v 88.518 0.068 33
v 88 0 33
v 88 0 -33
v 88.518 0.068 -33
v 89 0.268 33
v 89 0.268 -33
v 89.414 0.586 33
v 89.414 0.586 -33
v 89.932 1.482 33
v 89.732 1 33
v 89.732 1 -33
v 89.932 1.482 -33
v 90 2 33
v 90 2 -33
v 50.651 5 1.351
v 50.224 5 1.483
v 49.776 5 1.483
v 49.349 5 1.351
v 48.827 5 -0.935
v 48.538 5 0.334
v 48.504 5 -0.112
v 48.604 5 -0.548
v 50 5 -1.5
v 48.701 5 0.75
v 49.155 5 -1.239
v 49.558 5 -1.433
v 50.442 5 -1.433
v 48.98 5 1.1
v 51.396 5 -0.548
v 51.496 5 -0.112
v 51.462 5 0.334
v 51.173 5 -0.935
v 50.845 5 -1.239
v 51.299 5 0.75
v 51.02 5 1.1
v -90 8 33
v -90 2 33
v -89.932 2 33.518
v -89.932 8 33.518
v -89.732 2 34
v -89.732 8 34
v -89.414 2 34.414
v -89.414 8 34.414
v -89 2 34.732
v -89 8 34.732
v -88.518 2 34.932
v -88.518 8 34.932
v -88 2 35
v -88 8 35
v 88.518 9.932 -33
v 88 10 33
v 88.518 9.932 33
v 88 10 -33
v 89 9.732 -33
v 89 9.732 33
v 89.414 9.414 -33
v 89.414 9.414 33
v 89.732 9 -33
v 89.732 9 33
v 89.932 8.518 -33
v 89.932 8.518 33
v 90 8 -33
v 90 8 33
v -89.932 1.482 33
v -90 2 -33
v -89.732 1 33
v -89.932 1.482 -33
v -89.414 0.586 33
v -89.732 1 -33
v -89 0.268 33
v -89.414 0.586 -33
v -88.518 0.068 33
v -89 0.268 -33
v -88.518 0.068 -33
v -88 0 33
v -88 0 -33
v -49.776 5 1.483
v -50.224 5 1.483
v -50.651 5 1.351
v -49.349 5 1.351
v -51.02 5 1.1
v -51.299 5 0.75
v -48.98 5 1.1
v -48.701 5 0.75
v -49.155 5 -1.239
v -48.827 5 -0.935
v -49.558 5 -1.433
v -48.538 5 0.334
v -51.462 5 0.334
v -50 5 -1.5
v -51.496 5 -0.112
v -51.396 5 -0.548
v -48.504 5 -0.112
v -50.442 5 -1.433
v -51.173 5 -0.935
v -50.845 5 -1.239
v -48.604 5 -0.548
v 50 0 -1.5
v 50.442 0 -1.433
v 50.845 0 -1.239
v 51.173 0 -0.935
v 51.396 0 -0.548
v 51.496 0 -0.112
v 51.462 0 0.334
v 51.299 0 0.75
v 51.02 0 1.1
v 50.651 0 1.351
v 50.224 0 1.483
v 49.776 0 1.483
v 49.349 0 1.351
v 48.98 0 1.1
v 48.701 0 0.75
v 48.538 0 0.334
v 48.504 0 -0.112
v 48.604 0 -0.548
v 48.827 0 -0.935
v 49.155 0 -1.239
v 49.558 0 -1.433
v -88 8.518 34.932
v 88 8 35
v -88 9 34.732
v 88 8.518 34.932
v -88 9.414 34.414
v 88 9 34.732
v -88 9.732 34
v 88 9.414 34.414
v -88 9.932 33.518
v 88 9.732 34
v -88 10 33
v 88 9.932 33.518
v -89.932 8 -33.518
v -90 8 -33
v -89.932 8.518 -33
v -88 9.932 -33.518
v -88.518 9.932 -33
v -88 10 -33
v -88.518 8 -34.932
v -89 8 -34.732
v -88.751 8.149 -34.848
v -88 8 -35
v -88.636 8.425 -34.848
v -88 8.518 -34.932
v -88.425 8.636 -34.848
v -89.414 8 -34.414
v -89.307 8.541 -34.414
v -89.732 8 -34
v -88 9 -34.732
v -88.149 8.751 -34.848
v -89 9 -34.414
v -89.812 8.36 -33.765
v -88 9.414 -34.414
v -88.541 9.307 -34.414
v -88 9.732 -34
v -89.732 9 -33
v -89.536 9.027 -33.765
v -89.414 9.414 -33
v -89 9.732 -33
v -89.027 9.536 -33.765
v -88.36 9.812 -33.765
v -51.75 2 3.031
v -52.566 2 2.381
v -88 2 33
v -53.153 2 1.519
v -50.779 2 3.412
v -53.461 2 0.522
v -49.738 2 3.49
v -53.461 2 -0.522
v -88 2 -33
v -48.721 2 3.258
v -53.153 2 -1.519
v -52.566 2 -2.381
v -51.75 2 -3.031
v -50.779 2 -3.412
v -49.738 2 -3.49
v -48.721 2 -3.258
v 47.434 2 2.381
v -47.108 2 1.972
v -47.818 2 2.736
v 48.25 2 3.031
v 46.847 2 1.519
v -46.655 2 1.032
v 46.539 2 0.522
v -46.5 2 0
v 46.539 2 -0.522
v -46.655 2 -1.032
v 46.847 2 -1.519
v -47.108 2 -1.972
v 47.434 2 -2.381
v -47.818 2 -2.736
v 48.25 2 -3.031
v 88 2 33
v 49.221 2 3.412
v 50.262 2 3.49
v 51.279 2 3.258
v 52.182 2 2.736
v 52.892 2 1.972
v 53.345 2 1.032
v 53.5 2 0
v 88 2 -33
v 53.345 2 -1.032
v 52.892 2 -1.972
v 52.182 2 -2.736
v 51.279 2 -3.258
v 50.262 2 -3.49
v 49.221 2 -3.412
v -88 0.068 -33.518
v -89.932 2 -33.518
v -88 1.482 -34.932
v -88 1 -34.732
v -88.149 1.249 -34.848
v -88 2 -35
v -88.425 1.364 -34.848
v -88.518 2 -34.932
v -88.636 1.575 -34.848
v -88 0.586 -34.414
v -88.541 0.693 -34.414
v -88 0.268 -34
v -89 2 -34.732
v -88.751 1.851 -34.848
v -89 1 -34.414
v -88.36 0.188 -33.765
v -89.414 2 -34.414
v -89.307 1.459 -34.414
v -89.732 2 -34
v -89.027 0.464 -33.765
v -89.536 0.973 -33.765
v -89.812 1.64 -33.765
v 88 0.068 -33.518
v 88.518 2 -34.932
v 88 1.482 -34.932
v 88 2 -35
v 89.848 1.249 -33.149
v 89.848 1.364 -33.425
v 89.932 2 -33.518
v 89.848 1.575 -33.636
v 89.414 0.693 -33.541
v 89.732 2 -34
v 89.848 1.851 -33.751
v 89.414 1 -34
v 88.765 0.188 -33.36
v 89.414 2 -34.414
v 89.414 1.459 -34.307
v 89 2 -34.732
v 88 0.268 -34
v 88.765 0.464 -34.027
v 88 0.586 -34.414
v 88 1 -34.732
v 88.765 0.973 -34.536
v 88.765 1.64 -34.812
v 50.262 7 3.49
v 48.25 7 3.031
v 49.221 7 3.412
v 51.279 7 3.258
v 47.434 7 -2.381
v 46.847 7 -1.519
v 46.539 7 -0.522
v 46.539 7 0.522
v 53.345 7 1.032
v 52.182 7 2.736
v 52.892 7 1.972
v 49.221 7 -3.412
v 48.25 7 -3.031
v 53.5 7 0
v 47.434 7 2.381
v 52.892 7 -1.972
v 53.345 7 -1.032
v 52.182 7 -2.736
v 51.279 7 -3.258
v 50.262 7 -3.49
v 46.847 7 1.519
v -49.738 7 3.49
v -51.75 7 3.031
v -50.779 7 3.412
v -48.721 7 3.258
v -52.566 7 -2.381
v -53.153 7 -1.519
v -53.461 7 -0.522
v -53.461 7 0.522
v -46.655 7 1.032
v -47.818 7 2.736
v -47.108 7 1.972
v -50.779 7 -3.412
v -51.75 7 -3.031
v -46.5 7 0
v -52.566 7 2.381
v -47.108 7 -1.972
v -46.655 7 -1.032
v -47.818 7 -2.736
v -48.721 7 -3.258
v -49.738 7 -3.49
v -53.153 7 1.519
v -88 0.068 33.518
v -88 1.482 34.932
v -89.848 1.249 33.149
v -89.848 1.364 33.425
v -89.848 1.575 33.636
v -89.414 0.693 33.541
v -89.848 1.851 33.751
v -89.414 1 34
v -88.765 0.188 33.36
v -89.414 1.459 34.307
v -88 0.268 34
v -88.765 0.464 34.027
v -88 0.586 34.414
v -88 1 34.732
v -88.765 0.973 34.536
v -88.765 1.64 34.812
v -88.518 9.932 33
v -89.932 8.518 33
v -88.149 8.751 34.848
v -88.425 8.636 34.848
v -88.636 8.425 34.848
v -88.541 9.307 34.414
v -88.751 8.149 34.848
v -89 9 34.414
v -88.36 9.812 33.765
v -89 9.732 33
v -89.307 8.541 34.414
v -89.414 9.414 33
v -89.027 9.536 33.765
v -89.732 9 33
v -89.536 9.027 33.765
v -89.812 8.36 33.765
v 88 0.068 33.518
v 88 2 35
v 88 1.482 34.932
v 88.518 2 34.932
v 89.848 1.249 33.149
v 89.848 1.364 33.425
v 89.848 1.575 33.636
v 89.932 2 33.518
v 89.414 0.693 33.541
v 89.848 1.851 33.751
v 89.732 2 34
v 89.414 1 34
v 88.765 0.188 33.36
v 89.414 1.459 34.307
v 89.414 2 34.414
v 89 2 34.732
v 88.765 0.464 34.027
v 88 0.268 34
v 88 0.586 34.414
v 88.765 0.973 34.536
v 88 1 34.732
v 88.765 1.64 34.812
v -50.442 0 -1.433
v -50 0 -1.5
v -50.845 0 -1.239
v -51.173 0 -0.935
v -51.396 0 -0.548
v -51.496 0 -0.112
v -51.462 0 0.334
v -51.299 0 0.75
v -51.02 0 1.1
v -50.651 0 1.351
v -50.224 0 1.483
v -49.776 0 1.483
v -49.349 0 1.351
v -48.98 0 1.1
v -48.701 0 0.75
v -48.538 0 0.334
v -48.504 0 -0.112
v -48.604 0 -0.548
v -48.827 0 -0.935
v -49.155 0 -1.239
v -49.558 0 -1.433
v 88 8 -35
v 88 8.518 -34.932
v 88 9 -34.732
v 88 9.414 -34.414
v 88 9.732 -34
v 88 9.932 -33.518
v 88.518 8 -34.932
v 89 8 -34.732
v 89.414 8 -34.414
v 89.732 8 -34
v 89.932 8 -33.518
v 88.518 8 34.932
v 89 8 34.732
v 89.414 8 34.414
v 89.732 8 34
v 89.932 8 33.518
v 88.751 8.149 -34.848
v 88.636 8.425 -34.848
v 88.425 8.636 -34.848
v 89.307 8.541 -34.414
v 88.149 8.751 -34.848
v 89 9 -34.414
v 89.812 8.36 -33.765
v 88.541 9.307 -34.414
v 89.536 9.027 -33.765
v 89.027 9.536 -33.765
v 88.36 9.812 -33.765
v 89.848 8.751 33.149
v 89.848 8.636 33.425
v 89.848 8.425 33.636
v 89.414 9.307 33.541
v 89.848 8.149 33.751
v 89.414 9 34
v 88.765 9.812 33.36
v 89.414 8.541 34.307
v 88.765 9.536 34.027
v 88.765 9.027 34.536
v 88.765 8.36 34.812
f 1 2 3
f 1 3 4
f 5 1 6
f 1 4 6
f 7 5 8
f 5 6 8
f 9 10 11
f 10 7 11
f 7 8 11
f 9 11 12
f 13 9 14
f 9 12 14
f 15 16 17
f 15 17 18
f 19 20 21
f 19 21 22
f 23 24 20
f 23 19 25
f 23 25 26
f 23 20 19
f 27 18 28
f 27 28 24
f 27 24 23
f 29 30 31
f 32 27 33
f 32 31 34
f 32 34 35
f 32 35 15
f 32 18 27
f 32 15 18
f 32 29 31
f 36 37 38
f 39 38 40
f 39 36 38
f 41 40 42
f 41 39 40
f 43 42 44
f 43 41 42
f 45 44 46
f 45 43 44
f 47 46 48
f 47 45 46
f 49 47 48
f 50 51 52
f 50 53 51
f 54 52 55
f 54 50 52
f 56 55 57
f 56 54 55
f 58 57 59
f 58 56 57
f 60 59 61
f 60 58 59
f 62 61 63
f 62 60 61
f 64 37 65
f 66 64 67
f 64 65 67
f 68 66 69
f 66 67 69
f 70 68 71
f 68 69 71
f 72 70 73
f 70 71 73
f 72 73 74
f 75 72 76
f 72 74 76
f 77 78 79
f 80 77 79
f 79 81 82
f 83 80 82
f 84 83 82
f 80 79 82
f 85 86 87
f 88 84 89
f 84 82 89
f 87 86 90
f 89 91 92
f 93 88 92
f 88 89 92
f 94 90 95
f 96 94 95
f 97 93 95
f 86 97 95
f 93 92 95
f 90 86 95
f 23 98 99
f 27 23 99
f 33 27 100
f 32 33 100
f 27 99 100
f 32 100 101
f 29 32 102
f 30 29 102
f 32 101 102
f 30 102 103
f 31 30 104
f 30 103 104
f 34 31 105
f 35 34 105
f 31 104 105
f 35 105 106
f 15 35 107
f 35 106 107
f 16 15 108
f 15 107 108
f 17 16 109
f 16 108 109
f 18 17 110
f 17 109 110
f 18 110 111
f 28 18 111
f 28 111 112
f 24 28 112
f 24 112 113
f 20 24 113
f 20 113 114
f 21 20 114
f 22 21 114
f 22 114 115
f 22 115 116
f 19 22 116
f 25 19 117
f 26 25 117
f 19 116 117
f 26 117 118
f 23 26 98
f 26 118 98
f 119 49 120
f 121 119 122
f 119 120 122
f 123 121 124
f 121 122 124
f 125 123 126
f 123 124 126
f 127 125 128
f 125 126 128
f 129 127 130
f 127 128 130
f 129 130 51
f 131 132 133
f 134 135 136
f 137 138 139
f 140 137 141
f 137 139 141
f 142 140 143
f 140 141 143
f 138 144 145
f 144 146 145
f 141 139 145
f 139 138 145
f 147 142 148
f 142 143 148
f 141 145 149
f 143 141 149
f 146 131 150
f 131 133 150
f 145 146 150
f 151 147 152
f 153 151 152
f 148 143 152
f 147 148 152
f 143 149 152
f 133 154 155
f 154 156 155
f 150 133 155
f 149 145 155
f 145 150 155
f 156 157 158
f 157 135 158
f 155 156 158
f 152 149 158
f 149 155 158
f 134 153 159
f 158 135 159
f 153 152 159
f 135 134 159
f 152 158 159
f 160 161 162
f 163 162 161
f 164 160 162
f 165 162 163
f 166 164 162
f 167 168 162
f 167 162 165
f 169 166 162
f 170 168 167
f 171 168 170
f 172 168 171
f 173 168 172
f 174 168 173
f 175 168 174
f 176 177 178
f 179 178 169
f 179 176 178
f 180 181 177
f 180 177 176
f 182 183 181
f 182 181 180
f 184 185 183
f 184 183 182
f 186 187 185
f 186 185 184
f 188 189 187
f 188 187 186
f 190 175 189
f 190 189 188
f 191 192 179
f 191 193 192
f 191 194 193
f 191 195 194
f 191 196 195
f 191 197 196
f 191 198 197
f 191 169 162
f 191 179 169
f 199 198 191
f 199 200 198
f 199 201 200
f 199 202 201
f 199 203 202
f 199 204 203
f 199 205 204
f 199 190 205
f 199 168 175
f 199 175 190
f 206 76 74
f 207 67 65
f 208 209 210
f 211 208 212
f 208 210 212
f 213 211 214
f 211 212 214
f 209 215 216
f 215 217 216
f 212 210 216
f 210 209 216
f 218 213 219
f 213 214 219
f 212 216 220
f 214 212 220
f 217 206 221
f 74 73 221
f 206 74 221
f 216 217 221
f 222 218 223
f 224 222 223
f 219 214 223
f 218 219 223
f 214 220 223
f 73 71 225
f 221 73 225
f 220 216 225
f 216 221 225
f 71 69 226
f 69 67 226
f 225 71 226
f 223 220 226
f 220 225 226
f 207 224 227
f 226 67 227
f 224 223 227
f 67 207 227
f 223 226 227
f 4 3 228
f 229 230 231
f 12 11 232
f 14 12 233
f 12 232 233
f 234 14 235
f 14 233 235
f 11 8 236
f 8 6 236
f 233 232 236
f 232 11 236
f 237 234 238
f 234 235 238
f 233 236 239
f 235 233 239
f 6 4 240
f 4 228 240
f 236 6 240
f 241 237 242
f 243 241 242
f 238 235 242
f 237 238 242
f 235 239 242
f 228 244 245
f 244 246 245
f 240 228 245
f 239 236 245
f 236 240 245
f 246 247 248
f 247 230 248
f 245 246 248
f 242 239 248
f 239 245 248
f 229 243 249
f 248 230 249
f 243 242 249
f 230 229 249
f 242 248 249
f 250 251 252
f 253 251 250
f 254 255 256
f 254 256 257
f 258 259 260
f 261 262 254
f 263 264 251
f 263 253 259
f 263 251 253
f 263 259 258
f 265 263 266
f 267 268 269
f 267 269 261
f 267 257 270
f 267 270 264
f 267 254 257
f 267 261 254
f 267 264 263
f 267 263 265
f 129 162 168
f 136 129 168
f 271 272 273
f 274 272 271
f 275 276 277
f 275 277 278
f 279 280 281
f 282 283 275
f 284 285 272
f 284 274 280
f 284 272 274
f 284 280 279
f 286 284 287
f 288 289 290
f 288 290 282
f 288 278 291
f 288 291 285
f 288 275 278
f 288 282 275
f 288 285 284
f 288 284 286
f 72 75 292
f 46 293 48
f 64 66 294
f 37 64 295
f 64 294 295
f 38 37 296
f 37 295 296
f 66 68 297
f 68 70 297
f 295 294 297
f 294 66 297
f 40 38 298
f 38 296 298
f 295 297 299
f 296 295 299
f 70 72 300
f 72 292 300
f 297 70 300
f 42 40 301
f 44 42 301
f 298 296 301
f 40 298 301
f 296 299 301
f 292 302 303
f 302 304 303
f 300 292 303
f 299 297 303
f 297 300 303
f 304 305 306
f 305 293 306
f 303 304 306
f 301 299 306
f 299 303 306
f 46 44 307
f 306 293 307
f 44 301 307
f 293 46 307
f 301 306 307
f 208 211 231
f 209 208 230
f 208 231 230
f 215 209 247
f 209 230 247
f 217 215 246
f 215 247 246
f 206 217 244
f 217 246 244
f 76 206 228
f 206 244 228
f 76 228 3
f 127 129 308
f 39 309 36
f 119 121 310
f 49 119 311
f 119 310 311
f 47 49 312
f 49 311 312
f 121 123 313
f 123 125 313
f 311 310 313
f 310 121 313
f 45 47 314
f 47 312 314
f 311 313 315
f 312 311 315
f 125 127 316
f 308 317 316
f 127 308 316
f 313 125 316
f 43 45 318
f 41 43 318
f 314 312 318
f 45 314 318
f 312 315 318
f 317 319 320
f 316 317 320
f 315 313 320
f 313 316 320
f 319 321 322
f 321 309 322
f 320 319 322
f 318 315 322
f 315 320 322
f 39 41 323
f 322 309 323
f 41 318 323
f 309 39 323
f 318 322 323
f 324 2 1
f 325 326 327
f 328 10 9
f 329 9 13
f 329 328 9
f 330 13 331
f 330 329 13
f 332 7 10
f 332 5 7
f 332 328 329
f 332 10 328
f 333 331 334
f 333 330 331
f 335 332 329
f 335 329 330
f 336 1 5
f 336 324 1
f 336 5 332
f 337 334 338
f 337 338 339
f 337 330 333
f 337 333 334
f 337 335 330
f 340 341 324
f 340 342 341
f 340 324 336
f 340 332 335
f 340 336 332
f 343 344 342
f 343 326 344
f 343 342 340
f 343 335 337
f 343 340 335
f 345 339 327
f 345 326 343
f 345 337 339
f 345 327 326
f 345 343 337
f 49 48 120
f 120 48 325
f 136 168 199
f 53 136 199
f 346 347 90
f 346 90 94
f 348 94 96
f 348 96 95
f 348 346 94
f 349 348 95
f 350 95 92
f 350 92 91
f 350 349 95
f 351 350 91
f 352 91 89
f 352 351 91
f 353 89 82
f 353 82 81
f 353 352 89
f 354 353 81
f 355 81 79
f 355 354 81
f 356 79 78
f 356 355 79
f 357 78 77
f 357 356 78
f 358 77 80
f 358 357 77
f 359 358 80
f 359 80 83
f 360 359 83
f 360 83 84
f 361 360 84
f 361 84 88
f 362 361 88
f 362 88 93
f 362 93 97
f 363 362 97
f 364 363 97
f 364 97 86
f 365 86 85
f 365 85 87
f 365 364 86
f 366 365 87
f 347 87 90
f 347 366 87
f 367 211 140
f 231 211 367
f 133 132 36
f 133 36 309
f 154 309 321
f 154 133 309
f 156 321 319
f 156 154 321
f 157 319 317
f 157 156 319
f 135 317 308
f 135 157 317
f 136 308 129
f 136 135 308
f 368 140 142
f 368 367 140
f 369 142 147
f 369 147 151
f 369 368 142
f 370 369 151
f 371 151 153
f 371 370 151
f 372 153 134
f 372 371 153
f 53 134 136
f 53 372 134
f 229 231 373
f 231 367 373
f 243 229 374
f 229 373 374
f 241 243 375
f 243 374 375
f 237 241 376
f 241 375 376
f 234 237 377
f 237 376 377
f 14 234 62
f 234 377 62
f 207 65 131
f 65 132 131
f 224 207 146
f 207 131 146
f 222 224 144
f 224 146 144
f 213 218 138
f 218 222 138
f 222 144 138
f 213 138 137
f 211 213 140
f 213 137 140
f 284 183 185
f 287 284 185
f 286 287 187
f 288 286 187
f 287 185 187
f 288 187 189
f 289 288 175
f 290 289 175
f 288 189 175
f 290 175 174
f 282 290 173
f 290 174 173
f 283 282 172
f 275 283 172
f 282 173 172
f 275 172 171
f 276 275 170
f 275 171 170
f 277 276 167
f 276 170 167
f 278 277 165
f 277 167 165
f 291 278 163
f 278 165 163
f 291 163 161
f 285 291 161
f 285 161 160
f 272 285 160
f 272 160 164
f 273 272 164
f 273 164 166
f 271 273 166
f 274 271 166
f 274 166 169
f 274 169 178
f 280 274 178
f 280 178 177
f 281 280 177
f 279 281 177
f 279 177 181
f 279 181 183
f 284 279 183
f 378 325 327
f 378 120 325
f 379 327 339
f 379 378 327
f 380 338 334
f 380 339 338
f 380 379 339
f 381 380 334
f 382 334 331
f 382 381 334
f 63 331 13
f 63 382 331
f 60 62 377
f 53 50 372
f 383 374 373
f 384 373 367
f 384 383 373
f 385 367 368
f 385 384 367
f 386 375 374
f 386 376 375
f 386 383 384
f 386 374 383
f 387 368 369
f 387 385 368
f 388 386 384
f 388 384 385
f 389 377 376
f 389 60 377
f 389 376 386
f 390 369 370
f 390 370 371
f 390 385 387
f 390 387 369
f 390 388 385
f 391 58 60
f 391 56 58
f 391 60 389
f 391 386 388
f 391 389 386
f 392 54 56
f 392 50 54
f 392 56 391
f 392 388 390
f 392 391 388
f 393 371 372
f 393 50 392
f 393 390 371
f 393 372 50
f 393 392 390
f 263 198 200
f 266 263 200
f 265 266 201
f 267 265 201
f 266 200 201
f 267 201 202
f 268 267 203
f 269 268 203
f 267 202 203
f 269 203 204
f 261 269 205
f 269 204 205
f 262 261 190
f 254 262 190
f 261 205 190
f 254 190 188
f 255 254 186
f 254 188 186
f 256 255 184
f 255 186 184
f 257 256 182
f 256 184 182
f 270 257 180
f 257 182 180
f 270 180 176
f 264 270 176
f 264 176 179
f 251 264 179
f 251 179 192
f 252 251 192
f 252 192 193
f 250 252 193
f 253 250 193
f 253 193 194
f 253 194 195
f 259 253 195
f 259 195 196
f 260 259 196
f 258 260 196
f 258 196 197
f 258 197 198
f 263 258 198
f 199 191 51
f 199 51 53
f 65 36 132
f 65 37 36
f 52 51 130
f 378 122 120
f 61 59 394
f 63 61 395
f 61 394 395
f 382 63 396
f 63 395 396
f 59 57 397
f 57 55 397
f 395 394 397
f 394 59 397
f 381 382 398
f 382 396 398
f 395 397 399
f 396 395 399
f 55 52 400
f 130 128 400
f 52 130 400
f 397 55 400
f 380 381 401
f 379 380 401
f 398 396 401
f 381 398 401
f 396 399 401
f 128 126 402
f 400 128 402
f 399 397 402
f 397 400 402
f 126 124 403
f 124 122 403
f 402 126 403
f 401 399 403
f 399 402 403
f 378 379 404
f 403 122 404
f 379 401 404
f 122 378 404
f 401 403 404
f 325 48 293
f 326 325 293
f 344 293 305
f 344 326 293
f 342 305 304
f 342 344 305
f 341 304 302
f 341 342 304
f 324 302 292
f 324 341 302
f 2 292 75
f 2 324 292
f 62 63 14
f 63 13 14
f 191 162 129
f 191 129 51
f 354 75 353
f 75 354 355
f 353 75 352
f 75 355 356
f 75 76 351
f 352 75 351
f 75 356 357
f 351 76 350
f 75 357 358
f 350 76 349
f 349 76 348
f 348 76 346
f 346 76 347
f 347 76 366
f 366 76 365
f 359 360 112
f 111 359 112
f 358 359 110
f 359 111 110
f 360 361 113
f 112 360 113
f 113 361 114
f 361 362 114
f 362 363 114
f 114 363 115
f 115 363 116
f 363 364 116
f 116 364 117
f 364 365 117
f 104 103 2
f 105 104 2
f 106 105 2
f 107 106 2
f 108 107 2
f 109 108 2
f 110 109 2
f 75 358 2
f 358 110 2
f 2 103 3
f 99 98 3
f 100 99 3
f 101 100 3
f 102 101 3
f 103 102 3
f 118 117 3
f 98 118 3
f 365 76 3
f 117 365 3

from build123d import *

# Parameters (mm, degrees)
SKETCH1_W           = 180
SKETCH1_H           = 70
BOSS_EXTRUDE1_DEPTH = 10
SKETCH2_R           = 1.5
CUT_EXTRUDE1_DEPTH  = 5
FILLET1_R           = 2
SHELL1_START        = 2
SHELL1_OUTLINE_W    = 176
SHELL1_OUTLINE_H    = 66
SHELL1_OUTLINE_R    = 3.5
SHELL1_DEPTH        = 8
SHELL1_START_2      = 7
SHELL1_2_OUTLINE_R  = 3.5
SHELL1_2_DEPTH      = 3


# Read off the part's stored shape, not the designer's step: Shell1
with BuildPart() as part:
    # Sketch1 → Boss-Extrude1 (new body)
    with BuildSketch(Plane(origin=(0, 0, 0), x_dir=(1, 0, 0), z_dir=(0, 1, 0))):
        Rectangle(SKETCH1_W, SKETCH1_H)
    extrude(amount=BOSS_EXTRUDE1_DEPTH)

    # Sketch2 → Cut-Extrude1 (cut)
    with BuildSketch(Plane.XZ):
        with Locations(Location((50, 0, 0), (0, 0, 270))):
            Circle(SKETCH2_R)
    cut_extrude1 = extrude(amount=-CUT_EXTRUDE1_DEPTH, mode=Mode.SUBTRACT)

    # Mirror1: Cut-Extrude1 across plane
    add(cut_extrude1.mirror(Plane(origin=(0, 0, 0), x_dir=(0, 0, 1), z_dir=(1, 0, 0))), mode=Mode.SUBTRACT)

    # Fillet1
    fillet1_edges = [part.edges().sort_by_distance(p)[0] for p in [
        (-90, 10, 0),
        (0, 10, 35),
        (90, 10, 0),
        (0, 0, 35),
        (-90, 0, 0),
        (0, 0, -35),
        (90, 0, 0),
        (90, 5, 35),
        (-90, 5, 35),
        (-90, 5, -35),
        (90, 5, -35),
        (0, 10, -35),
    ]]
    fillet(fillet1_edges, radius=FILLET1_R)

    # Shell1 outline → Shell1 (cut)
    with BuildSketch(Plane(origin=(0, 0, 0), x_dir=(1, 0, 0), z_dir=(0, 1, 0)).offset(SHELL1_START)):
        Rectangle(SHELL1_OUTLINE_W, SHELL1_OUTLINE_H)
        with Locations((-50, 0)):
            Circle(SHELL1_OUTLINE_R, mode=Mode.SUBTRACT)
        with Locations((50, 0)):
            Circle(SHELL1_OUTLINE_R, mode=Mode.SUBTRACT)
    extrude(amount=SHELL1_DEPTH, mode=Mode.SUBTRACT)

    # Shell1 2 outline → Shell1 2 (cut)
    with BuildSketch(Plane(origin=(0, 0, 0), x_dir=(1, 0, 0), z_dir=(0, 1, 0)).offset(SHELL1_START_2)):
        with Locations((50, 0)):
            Circle(SHELL1_2_OUTLINE_R)
        with Locations((-50, 0)):
            Circle(SHELL1_2_OUTLINE_R)
    extrude(amount=SHELL1_2_DEPTH, mode=Mode.SUBTRACT)


solid = part.part
